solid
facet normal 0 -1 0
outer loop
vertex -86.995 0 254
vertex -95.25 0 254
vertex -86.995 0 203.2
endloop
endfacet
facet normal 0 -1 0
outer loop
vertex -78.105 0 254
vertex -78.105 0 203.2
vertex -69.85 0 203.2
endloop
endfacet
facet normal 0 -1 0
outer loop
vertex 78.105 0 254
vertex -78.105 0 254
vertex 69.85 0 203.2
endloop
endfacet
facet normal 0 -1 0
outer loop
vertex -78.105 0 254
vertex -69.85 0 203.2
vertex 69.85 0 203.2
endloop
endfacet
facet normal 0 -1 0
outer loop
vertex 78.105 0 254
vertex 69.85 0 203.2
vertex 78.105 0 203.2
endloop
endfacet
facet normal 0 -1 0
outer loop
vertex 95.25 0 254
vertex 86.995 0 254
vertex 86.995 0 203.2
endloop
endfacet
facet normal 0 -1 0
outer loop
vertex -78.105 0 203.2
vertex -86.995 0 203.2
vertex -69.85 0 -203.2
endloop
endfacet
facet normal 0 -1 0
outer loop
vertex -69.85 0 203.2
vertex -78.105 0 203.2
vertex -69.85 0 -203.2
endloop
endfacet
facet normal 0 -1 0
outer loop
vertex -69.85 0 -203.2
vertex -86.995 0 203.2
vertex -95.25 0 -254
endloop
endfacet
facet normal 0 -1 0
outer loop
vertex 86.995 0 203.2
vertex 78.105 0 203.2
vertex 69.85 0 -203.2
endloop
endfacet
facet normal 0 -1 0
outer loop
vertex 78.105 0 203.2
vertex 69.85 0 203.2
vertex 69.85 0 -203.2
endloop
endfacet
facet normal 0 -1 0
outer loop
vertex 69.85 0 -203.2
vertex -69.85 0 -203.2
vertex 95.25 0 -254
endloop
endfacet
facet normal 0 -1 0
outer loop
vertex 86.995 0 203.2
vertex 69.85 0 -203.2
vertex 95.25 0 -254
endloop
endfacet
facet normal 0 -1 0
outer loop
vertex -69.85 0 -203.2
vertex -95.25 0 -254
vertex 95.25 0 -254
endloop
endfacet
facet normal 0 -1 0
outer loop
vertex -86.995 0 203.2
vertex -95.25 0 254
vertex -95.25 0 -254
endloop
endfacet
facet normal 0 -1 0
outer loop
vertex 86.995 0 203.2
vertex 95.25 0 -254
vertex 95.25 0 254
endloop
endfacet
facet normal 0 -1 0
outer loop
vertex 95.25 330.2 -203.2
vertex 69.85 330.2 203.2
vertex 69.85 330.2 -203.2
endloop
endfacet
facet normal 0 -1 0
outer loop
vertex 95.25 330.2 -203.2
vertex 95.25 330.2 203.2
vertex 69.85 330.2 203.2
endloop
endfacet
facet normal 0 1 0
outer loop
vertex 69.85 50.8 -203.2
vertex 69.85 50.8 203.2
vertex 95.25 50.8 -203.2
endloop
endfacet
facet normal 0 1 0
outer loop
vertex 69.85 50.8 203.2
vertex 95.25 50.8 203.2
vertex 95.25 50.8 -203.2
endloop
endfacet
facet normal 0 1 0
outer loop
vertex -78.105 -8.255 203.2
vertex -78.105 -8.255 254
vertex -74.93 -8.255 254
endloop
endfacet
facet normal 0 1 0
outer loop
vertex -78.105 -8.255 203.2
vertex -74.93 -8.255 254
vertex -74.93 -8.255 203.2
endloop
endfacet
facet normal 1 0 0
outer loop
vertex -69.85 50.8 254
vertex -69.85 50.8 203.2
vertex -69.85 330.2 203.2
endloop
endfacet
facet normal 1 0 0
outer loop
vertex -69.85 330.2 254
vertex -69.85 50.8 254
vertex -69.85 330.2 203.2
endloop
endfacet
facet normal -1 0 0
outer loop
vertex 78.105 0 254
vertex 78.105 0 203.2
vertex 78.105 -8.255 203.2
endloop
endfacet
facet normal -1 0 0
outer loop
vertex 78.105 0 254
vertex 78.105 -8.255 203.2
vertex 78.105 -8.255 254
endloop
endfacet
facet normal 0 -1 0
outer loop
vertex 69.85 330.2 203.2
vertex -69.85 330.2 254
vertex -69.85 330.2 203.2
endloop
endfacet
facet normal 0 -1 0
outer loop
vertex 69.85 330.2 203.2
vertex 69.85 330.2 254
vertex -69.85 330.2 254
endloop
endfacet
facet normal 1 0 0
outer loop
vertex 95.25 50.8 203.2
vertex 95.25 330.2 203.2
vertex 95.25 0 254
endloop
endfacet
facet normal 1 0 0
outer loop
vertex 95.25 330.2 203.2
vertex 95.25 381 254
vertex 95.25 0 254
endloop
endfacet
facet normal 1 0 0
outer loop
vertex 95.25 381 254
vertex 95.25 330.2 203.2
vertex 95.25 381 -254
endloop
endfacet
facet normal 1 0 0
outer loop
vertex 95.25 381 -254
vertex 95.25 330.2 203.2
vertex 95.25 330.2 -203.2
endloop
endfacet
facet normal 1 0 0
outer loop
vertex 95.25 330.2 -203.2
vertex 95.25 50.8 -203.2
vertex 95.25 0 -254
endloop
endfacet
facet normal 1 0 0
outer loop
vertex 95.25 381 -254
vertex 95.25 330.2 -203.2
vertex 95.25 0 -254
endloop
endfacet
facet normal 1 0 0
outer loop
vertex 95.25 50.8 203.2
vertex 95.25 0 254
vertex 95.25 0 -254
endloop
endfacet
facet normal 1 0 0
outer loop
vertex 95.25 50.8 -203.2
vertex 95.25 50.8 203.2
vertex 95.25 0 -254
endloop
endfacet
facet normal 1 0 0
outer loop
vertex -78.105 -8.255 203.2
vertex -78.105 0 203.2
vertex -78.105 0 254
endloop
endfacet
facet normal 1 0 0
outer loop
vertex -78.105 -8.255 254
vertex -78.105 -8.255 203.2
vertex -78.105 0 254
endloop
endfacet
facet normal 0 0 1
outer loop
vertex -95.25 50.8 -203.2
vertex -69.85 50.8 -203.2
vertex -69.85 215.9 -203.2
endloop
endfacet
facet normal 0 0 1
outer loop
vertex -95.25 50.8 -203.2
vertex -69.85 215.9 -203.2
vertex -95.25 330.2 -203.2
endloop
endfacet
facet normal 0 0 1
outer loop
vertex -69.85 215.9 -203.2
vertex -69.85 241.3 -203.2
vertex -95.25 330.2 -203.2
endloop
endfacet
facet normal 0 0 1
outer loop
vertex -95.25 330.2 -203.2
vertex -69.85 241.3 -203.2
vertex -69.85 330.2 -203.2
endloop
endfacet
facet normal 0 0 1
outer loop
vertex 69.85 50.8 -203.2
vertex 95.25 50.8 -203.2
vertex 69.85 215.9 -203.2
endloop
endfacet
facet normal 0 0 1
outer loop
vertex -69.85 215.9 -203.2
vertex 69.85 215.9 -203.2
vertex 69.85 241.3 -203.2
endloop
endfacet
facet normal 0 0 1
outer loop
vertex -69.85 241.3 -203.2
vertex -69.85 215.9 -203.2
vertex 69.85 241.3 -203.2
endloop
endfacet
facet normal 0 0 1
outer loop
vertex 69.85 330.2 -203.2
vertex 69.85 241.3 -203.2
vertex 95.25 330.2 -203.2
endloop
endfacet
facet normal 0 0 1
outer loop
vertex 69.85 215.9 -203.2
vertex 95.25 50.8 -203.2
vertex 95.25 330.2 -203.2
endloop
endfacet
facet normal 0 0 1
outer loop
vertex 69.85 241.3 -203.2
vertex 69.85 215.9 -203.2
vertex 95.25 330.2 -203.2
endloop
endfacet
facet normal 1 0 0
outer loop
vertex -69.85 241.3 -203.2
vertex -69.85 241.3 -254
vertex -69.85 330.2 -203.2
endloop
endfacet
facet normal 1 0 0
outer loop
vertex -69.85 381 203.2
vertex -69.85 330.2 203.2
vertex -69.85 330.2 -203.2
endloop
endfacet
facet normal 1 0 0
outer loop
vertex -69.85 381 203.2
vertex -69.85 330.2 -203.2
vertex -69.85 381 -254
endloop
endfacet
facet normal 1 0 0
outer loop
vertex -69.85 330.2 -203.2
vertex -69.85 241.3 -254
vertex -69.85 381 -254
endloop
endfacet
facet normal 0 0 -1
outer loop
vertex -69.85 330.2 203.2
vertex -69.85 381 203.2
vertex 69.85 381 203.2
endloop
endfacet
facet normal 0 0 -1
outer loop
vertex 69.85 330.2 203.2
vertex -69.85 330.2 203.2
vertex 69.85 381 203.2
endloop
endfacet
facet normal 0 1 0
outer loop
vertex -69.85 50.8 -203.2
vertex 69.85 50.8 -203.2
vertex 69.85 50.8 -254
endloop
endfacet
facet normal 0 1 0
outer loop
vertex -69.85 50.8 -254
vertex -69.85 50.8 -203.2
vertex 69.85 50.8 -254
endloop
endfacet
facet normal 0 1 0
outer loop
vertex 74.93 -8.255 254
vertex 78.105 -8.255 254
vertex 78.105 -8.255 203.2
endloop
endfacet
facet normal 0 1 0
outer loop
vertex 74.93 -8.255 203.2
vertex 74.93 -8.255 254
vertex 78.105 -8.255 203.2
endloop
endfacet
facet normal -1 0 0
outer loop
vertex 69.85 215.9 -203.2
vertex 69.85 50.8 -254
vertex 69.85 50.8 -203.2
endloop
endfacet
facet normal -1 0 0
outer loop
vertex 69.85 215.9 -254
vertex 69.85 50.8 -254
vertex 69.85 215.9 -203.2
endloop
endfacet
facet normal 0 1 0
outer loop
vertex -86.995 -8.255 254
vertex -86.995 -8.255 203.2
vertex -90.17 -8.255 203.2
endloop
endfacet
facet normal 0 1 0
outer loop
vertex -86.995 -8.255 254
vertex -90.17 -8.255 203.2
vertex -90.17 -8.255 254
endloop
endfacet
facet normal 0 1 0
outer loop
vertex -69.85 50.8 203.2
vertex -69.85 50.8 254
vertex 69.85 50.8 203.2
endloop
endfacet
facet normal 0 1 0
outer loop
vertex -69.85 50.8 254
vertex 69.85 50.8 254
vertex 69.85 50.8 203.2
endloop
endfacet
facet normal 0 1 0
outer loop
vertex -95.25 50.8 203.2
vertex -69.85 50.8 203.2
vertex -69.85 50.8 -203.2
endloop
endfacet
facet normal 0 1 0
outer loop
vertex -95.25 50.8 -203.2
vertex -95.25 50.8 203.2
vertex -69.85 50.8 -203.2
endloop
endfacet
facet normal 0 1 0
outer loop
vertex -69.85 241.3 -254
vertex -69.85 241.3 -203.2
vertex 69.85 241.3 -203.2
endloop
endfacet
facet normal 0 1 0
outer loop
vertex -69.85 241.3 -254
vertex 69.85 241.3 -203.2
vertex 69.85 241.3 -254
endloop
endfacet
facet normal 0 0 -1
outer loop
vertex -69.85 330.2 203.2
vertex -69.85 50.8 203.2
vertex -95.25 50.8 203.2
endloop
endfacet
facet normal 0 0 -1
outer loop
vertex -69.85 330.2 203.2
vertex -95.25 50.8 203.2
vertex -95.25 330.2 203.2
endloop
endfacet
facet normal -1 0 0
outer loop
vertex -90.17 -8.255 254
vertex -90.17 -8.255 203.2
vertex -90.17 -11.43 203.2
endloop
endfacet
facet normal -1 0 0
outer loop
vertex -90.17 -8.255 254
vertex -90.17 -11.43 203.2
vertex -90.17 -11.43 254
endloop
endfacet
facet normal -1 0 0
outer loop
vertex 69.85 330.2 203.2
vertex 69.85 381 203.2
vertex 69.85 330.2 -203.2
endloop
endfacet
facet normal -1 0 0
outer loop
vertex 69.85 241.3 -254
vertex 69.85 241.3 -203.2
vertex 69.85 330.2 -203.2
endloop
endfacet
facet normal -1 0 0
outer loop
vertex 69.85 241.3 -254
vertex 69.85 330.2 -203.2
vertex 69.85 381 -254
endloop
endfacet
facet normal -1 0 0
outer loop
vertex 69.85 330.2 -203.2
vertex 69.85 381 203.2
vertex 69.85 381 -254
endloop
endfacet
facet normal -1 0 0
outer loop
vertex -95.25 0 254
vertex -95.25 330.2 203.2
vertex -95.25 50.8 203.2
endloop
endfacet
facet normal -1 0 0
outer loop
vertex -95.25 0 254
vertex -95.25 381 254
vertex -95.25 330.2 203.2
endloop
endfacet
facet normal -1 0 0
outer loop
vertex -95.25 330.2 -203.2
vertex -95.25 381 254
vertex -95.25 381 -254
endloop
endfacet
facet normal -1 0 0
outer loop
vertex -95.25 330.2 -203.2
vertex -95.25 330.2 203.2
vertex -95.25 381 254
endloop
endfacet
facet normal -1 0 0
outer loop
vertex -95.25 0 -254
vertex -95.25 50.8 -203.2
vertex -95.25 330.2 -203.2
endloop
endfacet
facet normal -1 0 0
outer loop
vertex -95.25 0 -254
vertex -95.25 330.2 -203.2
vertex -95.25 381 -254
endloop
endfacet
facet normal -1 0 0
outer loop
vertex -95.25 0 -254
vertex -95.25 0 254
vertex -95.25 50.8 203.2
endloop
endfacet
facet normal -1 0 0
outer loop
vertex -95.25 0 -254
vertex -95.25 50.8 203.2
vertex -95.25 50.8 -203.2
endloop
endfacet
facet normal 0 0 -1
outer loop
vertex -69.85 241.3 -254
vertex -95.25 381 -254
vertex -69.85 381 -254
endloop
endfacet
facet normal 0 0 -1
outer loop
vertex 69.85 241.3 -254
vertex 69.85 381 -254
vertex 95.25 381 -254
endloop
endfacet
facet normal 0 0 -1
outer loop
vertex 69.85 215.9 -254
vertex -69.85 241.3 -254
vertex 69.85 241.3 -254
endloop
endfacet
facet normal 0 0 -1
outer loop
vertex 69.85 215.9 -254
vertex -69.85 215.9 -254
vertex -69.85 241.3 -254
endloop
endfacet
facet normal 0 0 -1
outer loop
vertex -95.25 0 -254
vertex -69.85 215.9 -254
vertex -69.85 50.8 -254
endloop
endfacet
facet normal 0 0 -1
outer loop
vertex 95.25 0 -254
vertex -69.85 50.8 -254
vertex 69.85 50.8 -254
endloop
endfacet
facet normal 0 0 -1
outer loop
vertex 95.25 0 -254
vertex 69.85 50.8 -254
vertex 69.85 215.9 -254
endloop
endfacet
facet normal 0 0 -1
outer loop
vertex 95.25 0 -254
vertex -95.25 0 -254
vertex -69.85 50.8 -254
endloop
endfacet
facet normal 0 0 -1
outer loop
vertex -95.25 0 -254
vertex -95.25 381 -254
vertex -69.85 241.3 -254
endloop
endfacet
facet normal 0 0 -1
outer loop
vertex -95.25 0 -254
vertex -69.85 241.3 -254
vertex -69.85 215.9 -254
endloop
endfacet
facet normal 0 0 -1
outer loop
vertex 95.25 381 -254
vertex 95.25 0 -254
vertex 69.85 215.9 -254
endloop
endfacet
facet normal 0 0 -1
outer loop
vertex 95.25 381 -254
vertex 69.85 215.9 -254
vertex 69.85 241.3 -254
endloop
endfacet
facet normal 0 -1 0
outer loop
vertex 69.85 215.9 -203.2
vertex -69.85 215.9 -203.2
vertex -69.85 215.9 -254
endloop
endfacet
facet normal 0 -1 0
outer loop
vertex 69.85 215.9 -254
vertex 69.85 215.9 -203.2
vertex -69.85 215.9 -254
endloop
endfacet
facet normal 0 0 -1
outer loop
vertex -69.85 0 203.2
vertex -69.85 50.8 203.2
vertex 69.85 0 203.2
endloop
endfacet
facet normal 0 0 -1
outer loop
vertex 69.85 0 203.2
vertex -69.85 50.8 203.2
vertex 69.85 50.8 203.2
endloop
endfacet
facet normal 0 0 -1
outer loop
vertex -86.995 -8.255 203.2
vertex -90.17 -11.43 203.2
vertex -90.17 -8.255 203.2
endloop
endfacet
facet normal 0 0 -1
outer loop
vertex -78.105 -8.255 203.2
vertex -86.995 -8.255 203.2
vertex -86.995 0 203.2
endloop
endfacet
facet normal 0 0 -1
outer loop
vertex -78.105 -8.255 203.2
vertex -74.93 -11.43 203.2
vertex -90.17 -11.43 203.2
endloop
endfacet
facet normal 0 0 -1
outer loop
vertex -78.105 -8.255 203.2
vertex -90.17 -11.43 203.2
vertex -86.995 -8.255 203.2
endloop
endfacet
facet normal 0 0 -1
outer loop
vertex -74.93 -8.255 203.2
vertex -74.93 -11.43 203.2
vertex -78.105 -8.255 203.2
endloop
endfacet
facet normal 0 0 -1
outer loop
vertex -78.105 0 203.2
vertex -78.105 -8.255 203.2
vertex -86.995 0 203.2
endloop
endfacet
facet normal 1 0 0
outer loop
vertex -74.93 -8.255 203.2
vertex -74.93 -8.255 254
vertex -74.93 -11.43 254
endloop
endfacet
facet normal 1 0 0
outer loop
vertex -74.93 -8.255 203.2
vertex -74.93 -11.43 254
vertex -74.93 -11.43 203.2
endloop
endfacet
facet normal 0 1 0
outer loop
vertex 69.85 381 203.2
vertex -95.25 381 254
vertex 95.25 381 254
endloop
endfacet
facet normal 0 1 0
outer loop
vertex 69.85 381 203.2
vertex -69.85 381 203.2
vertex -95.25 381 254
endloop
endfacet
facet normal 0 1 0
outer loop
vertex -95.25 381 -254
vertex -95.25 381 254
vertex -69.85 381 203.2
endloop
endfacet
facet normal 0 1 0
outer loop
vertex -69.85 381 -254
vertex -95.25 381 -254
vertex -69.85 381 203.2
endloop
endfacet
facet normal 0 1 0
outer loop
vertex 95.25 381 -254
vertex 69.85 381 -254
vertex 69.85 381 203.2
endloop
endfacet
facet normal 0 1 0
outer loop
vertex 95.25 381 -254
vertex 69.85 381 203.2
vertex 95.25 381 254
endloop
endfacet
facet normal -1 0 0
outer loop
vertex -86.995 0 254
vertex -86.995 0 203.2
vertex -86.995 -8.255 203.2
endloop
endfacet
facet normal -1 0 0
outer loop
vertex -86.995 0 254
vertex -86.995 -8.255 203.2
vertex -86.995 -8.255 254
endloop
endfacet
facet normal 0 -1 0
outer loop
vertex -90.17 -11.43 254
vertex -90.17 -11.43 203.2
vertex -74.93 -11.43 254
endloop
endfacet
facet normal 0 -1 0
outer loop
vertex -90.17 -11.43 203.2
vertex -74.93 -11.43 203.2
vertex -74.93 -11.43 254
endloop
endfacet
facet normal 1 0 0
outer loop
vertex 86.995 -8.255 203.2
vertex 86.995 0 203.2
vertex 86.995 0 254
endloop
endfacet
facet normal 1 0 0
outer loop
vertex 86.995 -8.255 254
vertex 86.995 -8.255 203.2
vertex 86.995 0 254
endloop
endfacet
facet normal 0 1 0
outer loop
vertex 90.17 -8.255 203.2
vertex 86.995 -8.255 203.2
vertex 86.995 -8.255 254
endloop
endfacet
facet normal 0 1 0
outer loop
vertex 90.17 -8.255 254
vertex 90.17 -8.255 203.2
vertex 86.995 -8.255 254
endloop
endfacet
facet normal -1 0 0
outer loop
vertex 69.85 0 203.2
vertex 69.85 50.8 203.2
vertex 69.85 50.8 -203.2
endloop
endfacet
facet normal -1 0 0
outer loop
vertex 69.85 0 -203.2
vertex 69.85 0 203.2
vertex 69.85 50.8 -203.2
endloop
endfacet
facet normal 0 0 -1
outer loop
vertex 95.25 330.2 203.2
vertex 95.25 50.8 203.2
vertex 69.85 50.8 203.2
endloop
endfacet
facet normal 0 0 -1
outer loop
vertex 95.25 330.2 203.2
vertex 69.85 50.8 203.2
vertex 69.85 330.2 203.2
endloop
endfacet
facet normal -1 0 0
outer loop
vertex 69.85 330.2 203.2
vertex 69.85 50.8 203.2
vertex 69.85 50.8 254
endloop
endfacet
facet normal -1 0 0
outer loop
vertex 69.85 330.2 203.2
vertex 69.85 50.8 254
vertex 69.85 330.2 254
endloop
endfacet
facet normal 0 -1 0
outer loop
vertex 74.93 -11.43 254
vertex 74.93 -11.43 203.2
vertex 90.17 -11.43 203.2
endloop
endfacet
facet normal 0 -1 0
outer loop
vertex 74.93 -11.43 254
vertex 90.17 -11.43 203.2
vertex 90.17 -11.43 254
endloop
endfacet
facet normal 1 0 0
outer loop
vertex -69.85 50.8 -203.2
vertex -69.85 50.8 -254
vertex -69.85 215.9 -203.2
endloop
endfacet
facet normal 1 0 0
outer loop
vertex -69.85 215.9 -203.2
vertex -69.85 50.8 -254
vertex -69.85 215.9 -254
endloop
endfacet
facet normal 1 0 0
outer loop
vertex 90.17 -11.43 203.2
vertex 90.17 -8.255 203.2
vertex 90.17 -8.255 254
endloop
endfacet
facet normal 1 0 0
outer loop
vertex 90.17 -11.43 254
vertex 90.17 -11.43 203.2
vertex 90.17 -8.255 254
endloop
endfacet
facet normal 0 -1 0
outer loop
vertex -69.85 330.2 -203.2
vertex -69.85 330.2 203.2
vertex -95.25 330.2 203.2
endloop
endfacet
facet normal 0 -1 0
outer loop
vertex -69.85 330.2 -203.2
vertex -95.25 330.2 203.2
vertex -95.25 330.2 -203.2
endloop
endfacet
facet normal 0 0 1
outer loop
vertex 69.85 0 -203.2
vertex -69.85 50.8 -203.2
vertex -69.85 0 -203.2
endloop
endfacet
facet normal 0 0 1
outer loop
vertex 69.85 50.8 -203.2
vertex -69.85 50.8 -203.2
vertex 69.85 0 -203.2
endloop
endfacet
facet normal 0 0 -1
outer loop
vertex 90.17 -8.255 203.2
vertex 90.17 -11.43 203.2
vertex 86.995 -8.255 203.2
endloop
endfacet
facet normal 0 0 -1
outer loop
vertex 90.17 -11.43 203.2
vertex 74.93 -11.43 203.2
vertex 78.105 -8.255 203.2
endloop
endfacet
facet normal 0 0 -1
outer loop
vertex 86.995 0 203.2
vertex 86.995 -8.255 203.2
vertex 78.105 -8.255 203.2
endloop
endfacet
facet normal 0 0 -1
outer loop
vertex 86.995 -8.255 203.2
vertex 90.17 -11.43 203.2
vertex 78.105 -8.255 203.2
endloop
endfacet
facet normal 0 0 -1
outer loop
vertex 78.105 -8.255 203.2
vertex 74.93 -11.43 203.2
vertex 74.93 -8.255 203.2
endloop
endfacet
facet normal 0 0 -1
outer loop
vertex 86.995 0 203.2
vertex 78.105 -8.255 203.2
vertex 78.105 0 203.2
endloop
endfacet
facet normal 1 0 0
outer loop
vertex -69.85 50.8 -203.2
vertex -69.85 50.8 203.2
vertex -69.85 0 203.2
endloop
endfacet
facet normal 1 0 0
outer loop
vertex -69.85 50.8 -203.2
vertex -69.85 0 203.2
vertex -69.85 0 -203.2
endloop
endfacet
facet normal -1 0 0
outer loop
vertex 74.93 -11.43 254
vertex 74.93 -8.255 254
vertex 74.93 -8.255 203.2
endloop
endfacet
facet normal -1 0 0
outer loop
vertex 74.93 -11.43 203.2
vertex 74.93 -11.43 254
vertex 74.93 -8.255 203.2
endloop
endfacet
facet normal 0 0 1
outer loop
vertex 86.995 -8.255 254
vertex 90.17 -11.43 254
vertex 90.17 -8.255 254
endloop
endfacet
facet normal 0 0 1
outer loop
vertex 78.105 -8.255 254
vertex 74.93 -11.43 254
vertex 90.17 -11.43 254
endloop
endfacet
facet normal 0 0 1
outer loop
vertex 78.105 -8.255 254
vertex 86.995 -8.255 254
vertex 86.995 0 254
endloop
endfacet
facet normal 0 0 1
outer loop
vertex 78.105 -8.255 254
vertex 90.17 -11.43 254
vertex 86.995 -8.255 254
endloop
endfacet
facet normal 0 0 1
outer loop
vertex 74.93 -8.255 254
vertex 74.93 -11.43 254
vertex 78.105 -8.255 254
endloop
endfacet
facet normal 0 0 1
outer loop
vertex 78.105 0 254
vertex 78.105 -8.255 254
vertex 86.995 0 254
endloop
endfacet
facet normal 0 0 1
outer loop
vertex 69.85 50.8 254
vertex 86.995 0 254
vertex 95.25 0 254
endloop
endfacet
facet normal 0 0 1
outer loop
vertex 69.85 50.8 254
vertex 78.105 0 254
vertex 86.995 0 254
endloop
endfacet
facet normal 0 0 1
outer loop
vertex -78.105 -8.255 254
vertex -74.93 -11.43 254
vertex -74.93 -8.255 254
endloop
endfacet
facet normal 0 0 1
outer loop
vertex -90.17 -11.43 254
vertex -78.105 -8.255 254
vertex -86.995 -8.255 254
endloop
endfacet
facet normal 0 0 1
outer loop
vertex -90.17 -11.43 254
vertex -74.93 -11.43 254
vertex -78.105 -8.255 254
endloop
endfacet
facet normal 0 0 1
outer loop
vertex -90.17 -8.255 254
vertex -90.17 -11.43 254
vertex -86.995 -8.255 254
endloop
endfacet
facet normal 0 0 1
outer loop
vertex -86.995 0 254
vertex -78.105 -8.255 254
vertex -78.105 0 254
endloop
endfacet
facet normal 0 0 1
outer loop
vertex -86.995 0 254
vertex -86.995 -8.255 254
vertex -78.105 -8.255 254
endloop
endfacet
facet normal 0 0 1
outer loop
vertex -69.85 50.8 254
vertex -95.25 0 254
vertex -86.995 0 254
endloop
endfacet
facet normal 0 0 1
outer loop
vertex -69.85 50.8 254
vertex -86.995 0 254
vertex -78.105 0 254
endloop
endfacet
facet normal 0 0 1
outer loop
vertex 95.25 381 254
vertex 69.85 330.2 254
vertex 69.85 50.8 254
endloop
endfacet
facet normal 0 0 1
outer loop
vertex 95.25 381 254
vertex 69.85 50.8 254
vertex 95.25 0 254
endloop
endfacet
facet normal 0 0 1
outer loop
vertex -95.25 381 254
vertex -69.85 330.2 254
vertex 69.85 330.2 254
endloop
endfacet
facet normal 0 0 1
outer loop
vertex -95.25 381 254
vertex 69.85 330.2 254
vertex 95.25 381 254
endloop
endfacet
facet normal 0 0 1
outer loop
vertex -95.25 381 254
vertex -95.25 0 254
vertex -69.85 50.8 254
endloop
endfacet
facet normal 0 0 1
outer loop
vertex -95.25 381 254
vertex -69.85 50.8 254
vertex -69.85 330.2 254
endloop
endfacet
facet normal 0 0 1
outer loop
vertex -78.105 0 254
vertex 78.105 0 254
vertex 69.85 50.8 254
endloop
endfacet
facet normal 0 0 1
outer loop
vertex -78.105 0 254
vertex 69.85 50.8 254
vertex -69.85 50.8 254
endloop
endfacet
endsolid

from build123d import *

# Parameters (mm, degrees)
SKETCH3_W           = 190.5
SKETCH3_H           = 508
BOSS_EXTRUDE1_DEPTH = 381
SKETCH4_W           = 406.4
SKETCH4_H           = 279.4
CUT_EXTRUDE1_DEPTH  = 381
SKETCH5_W           = 139.7
SKETCH5_H           = 279.4
CUT_EXTRUDE2_DEPTH  = 924.052
SKETCH6_W           = 139.7
SKETCH6_H           = 406.4
CUT_EXTRUDE3_DEPTH  = 924.052
SKETCH7_W           = 8.89
SKETCH7_H           = 50.8
BOSS_EXTRUDE2_DEPTH = 11.43
SKETCH8_W           = 50.8
SKETCH8_H           = 3.175
BOSS_EXTRUDE3_DEPTH = 3.175
SKETCH9_W           = 50.8
SKETCH9_H           = 3.175
BOSS_EXTRUDE4_DEPTH = 3.175
BOSS_EXTRUDE6_REACH = 488.76
SKETCH11_W          = 50.8
SKETCH11_H          = 25.4
CUT_EXTRUDE4_REACH  = 479.064
SKETCH12_W          = 139.7
SKETCH12_H          = 50.8


with BuildPart() as part:
    # Sketch3 → Boss-Extrude1 (new body)
    with BuildSketch(Plane(origin=(0, 0, 0), x_dir=(1, 0, 0), z_dir=(0, 1, 0))):
        Rectangle(SKETCH3_W, SKETCH3_H)
    extrude(amount=BOSS_EXTRUDE1_DEPTH)

    # Sketch4 → Cut-Extrude1 (cut)
    with BuildSketch(Plane(origin=(95.25, 0, 0), x_dir=(0, 0, -1), z_dir=(1, 0, 0))):
        with Locations((0, 190.5)):
            Rectangle(SKETCH4_W, SKETCH4_H)
    extrude(amount=-CUT_EXTRUDE1_DEPTH, mode=Mode.SUBTRACT)

    # Sketch5 → Cut-Extrude2 (cut)
    with BuildSketch(Plane(origin=(0, 0, -254), x_dir=(-1, 0, 0), z_dir=(0, 0, -1))):
        with Locations((0, 190.5)):
            Rectangle(SKETCH5_W, SKETCH5_H)
    extrude(amount=-CUT_EXTRUDE2_DEPTH, mode=Mode.SUBTRACT)

    # Sketch6 → Cut-Extrude3 (cut)
    with BuildSketch(Plane(origin=(0, 381, 0), x_dir=(1, 0, 0), z_dir=(0, 1, 0))):
        Rectangle(SKETCH6_W, SKETCH6_H)
    extrude(amount=-CUT_EXTRUDE3_DEPTH, mode=Mode.SUBTRACT)

    # Sketch7 → Boss-Extrude2 (add)
    with BuildSketch(Plane.XZ):
        with Locations((-82.55, 228.6)):
            Rectangle(SKETCH7_W, SKETCH7_H)
    boss_extrude2 = extrude(amount=BOSS_EXTRUDE2_DEPTH)

    # Sketch8 → Boss-Extrude3 (add)
    with BuildSketch(Plane(origin=(-78.105, 0, 0), x_dir=(0, 0, -1), z_dir=(1, 0, 0))):
        with Locations((-228.6, -9.8425)):
            Rectangle(SKETCH8_W, SKETCH8_H)
    boss_extrude3 = extrude(amount=BOSS_EXTRUDE3_DEPTH)

    # Sketch9 → Boss-Extrude4 (add)
    with BuildSketch(Plane.ZY.offset(86.995)):
        with Locations((228.6, -9.8425)):
            Rectangle(SKETCH9_W, SKETCH9_H)
    boss_extrude4 = extrude(amount=BOSS_EXTRUDE4_DEPTH)

    # Mirror1: Boss-Extrude2, Boss-Extrude3, Boss-Extrude4 across plane
    add(boss_extrude2.mirror(Plane(origin=(0, 0, 0), x_dir=(0, 0, 1), z_dir=(1, 0, 0))))
    add(boss_extrude3.mirror(Plane(origin=(0, 0, 0), x_dir=(0, 0, 1), z_dir=(1, 0, 0))))
    add(boss_extrude4.mirror(Plane(origin=(0, 0, 0), x_dir=(0, 0, 1), z_dir=(1, 0, 0))))

    # Sketch11 → Boss-Extrude6 (add, up to next)
    with BuildSketch(Plane(origin=(-69.85, 0, 0), x_dir=(0, 0, -1), z_dir=(1, 0, 0)), mode=Mode.PRIVATE) as boss_extrude6_sk1:
        with Locations((228.6, 228.6)):
            Rectangle(SKETCH11_W, SKETCH11_H)
    boss_extrude6_tool1 = extrude(boss_extrude6_sk1.sketch, amount=BOSS_EXTRUDE6_REACH, mode=Mode.PRIVATE) - part.part
    add(boss_extrude6_tool1.solids().sort_by_distance((-69.85, 228.6, -228.6))[0])

    # Sketch12 → Cut-Extrude4 (cut, up to next)
    with BuildSketch(Plane(origin=(0, 381, 0), x_dir=(1, 0, 0), z_dir=(0, 1, 0)), mode=Mode.PRIVATE) as cut_extrude4_sk1:
        with Locations((0, 228.6)):
            Rectangle(SKETCH12_W, SKETCH12_H)
    cut_extrude4_tool1 = extrude(cut_extrude4_sk1.sketch, amount=-CUT_EXTRUDE4_REACH, mode=Mode.PRIVATE) & part.part
    add(cut_extrude4_tool1.solids().sort_by_distance((0, 381, -228.6))[0], mode=Mode.SUBTRACT)


solid = part.part
